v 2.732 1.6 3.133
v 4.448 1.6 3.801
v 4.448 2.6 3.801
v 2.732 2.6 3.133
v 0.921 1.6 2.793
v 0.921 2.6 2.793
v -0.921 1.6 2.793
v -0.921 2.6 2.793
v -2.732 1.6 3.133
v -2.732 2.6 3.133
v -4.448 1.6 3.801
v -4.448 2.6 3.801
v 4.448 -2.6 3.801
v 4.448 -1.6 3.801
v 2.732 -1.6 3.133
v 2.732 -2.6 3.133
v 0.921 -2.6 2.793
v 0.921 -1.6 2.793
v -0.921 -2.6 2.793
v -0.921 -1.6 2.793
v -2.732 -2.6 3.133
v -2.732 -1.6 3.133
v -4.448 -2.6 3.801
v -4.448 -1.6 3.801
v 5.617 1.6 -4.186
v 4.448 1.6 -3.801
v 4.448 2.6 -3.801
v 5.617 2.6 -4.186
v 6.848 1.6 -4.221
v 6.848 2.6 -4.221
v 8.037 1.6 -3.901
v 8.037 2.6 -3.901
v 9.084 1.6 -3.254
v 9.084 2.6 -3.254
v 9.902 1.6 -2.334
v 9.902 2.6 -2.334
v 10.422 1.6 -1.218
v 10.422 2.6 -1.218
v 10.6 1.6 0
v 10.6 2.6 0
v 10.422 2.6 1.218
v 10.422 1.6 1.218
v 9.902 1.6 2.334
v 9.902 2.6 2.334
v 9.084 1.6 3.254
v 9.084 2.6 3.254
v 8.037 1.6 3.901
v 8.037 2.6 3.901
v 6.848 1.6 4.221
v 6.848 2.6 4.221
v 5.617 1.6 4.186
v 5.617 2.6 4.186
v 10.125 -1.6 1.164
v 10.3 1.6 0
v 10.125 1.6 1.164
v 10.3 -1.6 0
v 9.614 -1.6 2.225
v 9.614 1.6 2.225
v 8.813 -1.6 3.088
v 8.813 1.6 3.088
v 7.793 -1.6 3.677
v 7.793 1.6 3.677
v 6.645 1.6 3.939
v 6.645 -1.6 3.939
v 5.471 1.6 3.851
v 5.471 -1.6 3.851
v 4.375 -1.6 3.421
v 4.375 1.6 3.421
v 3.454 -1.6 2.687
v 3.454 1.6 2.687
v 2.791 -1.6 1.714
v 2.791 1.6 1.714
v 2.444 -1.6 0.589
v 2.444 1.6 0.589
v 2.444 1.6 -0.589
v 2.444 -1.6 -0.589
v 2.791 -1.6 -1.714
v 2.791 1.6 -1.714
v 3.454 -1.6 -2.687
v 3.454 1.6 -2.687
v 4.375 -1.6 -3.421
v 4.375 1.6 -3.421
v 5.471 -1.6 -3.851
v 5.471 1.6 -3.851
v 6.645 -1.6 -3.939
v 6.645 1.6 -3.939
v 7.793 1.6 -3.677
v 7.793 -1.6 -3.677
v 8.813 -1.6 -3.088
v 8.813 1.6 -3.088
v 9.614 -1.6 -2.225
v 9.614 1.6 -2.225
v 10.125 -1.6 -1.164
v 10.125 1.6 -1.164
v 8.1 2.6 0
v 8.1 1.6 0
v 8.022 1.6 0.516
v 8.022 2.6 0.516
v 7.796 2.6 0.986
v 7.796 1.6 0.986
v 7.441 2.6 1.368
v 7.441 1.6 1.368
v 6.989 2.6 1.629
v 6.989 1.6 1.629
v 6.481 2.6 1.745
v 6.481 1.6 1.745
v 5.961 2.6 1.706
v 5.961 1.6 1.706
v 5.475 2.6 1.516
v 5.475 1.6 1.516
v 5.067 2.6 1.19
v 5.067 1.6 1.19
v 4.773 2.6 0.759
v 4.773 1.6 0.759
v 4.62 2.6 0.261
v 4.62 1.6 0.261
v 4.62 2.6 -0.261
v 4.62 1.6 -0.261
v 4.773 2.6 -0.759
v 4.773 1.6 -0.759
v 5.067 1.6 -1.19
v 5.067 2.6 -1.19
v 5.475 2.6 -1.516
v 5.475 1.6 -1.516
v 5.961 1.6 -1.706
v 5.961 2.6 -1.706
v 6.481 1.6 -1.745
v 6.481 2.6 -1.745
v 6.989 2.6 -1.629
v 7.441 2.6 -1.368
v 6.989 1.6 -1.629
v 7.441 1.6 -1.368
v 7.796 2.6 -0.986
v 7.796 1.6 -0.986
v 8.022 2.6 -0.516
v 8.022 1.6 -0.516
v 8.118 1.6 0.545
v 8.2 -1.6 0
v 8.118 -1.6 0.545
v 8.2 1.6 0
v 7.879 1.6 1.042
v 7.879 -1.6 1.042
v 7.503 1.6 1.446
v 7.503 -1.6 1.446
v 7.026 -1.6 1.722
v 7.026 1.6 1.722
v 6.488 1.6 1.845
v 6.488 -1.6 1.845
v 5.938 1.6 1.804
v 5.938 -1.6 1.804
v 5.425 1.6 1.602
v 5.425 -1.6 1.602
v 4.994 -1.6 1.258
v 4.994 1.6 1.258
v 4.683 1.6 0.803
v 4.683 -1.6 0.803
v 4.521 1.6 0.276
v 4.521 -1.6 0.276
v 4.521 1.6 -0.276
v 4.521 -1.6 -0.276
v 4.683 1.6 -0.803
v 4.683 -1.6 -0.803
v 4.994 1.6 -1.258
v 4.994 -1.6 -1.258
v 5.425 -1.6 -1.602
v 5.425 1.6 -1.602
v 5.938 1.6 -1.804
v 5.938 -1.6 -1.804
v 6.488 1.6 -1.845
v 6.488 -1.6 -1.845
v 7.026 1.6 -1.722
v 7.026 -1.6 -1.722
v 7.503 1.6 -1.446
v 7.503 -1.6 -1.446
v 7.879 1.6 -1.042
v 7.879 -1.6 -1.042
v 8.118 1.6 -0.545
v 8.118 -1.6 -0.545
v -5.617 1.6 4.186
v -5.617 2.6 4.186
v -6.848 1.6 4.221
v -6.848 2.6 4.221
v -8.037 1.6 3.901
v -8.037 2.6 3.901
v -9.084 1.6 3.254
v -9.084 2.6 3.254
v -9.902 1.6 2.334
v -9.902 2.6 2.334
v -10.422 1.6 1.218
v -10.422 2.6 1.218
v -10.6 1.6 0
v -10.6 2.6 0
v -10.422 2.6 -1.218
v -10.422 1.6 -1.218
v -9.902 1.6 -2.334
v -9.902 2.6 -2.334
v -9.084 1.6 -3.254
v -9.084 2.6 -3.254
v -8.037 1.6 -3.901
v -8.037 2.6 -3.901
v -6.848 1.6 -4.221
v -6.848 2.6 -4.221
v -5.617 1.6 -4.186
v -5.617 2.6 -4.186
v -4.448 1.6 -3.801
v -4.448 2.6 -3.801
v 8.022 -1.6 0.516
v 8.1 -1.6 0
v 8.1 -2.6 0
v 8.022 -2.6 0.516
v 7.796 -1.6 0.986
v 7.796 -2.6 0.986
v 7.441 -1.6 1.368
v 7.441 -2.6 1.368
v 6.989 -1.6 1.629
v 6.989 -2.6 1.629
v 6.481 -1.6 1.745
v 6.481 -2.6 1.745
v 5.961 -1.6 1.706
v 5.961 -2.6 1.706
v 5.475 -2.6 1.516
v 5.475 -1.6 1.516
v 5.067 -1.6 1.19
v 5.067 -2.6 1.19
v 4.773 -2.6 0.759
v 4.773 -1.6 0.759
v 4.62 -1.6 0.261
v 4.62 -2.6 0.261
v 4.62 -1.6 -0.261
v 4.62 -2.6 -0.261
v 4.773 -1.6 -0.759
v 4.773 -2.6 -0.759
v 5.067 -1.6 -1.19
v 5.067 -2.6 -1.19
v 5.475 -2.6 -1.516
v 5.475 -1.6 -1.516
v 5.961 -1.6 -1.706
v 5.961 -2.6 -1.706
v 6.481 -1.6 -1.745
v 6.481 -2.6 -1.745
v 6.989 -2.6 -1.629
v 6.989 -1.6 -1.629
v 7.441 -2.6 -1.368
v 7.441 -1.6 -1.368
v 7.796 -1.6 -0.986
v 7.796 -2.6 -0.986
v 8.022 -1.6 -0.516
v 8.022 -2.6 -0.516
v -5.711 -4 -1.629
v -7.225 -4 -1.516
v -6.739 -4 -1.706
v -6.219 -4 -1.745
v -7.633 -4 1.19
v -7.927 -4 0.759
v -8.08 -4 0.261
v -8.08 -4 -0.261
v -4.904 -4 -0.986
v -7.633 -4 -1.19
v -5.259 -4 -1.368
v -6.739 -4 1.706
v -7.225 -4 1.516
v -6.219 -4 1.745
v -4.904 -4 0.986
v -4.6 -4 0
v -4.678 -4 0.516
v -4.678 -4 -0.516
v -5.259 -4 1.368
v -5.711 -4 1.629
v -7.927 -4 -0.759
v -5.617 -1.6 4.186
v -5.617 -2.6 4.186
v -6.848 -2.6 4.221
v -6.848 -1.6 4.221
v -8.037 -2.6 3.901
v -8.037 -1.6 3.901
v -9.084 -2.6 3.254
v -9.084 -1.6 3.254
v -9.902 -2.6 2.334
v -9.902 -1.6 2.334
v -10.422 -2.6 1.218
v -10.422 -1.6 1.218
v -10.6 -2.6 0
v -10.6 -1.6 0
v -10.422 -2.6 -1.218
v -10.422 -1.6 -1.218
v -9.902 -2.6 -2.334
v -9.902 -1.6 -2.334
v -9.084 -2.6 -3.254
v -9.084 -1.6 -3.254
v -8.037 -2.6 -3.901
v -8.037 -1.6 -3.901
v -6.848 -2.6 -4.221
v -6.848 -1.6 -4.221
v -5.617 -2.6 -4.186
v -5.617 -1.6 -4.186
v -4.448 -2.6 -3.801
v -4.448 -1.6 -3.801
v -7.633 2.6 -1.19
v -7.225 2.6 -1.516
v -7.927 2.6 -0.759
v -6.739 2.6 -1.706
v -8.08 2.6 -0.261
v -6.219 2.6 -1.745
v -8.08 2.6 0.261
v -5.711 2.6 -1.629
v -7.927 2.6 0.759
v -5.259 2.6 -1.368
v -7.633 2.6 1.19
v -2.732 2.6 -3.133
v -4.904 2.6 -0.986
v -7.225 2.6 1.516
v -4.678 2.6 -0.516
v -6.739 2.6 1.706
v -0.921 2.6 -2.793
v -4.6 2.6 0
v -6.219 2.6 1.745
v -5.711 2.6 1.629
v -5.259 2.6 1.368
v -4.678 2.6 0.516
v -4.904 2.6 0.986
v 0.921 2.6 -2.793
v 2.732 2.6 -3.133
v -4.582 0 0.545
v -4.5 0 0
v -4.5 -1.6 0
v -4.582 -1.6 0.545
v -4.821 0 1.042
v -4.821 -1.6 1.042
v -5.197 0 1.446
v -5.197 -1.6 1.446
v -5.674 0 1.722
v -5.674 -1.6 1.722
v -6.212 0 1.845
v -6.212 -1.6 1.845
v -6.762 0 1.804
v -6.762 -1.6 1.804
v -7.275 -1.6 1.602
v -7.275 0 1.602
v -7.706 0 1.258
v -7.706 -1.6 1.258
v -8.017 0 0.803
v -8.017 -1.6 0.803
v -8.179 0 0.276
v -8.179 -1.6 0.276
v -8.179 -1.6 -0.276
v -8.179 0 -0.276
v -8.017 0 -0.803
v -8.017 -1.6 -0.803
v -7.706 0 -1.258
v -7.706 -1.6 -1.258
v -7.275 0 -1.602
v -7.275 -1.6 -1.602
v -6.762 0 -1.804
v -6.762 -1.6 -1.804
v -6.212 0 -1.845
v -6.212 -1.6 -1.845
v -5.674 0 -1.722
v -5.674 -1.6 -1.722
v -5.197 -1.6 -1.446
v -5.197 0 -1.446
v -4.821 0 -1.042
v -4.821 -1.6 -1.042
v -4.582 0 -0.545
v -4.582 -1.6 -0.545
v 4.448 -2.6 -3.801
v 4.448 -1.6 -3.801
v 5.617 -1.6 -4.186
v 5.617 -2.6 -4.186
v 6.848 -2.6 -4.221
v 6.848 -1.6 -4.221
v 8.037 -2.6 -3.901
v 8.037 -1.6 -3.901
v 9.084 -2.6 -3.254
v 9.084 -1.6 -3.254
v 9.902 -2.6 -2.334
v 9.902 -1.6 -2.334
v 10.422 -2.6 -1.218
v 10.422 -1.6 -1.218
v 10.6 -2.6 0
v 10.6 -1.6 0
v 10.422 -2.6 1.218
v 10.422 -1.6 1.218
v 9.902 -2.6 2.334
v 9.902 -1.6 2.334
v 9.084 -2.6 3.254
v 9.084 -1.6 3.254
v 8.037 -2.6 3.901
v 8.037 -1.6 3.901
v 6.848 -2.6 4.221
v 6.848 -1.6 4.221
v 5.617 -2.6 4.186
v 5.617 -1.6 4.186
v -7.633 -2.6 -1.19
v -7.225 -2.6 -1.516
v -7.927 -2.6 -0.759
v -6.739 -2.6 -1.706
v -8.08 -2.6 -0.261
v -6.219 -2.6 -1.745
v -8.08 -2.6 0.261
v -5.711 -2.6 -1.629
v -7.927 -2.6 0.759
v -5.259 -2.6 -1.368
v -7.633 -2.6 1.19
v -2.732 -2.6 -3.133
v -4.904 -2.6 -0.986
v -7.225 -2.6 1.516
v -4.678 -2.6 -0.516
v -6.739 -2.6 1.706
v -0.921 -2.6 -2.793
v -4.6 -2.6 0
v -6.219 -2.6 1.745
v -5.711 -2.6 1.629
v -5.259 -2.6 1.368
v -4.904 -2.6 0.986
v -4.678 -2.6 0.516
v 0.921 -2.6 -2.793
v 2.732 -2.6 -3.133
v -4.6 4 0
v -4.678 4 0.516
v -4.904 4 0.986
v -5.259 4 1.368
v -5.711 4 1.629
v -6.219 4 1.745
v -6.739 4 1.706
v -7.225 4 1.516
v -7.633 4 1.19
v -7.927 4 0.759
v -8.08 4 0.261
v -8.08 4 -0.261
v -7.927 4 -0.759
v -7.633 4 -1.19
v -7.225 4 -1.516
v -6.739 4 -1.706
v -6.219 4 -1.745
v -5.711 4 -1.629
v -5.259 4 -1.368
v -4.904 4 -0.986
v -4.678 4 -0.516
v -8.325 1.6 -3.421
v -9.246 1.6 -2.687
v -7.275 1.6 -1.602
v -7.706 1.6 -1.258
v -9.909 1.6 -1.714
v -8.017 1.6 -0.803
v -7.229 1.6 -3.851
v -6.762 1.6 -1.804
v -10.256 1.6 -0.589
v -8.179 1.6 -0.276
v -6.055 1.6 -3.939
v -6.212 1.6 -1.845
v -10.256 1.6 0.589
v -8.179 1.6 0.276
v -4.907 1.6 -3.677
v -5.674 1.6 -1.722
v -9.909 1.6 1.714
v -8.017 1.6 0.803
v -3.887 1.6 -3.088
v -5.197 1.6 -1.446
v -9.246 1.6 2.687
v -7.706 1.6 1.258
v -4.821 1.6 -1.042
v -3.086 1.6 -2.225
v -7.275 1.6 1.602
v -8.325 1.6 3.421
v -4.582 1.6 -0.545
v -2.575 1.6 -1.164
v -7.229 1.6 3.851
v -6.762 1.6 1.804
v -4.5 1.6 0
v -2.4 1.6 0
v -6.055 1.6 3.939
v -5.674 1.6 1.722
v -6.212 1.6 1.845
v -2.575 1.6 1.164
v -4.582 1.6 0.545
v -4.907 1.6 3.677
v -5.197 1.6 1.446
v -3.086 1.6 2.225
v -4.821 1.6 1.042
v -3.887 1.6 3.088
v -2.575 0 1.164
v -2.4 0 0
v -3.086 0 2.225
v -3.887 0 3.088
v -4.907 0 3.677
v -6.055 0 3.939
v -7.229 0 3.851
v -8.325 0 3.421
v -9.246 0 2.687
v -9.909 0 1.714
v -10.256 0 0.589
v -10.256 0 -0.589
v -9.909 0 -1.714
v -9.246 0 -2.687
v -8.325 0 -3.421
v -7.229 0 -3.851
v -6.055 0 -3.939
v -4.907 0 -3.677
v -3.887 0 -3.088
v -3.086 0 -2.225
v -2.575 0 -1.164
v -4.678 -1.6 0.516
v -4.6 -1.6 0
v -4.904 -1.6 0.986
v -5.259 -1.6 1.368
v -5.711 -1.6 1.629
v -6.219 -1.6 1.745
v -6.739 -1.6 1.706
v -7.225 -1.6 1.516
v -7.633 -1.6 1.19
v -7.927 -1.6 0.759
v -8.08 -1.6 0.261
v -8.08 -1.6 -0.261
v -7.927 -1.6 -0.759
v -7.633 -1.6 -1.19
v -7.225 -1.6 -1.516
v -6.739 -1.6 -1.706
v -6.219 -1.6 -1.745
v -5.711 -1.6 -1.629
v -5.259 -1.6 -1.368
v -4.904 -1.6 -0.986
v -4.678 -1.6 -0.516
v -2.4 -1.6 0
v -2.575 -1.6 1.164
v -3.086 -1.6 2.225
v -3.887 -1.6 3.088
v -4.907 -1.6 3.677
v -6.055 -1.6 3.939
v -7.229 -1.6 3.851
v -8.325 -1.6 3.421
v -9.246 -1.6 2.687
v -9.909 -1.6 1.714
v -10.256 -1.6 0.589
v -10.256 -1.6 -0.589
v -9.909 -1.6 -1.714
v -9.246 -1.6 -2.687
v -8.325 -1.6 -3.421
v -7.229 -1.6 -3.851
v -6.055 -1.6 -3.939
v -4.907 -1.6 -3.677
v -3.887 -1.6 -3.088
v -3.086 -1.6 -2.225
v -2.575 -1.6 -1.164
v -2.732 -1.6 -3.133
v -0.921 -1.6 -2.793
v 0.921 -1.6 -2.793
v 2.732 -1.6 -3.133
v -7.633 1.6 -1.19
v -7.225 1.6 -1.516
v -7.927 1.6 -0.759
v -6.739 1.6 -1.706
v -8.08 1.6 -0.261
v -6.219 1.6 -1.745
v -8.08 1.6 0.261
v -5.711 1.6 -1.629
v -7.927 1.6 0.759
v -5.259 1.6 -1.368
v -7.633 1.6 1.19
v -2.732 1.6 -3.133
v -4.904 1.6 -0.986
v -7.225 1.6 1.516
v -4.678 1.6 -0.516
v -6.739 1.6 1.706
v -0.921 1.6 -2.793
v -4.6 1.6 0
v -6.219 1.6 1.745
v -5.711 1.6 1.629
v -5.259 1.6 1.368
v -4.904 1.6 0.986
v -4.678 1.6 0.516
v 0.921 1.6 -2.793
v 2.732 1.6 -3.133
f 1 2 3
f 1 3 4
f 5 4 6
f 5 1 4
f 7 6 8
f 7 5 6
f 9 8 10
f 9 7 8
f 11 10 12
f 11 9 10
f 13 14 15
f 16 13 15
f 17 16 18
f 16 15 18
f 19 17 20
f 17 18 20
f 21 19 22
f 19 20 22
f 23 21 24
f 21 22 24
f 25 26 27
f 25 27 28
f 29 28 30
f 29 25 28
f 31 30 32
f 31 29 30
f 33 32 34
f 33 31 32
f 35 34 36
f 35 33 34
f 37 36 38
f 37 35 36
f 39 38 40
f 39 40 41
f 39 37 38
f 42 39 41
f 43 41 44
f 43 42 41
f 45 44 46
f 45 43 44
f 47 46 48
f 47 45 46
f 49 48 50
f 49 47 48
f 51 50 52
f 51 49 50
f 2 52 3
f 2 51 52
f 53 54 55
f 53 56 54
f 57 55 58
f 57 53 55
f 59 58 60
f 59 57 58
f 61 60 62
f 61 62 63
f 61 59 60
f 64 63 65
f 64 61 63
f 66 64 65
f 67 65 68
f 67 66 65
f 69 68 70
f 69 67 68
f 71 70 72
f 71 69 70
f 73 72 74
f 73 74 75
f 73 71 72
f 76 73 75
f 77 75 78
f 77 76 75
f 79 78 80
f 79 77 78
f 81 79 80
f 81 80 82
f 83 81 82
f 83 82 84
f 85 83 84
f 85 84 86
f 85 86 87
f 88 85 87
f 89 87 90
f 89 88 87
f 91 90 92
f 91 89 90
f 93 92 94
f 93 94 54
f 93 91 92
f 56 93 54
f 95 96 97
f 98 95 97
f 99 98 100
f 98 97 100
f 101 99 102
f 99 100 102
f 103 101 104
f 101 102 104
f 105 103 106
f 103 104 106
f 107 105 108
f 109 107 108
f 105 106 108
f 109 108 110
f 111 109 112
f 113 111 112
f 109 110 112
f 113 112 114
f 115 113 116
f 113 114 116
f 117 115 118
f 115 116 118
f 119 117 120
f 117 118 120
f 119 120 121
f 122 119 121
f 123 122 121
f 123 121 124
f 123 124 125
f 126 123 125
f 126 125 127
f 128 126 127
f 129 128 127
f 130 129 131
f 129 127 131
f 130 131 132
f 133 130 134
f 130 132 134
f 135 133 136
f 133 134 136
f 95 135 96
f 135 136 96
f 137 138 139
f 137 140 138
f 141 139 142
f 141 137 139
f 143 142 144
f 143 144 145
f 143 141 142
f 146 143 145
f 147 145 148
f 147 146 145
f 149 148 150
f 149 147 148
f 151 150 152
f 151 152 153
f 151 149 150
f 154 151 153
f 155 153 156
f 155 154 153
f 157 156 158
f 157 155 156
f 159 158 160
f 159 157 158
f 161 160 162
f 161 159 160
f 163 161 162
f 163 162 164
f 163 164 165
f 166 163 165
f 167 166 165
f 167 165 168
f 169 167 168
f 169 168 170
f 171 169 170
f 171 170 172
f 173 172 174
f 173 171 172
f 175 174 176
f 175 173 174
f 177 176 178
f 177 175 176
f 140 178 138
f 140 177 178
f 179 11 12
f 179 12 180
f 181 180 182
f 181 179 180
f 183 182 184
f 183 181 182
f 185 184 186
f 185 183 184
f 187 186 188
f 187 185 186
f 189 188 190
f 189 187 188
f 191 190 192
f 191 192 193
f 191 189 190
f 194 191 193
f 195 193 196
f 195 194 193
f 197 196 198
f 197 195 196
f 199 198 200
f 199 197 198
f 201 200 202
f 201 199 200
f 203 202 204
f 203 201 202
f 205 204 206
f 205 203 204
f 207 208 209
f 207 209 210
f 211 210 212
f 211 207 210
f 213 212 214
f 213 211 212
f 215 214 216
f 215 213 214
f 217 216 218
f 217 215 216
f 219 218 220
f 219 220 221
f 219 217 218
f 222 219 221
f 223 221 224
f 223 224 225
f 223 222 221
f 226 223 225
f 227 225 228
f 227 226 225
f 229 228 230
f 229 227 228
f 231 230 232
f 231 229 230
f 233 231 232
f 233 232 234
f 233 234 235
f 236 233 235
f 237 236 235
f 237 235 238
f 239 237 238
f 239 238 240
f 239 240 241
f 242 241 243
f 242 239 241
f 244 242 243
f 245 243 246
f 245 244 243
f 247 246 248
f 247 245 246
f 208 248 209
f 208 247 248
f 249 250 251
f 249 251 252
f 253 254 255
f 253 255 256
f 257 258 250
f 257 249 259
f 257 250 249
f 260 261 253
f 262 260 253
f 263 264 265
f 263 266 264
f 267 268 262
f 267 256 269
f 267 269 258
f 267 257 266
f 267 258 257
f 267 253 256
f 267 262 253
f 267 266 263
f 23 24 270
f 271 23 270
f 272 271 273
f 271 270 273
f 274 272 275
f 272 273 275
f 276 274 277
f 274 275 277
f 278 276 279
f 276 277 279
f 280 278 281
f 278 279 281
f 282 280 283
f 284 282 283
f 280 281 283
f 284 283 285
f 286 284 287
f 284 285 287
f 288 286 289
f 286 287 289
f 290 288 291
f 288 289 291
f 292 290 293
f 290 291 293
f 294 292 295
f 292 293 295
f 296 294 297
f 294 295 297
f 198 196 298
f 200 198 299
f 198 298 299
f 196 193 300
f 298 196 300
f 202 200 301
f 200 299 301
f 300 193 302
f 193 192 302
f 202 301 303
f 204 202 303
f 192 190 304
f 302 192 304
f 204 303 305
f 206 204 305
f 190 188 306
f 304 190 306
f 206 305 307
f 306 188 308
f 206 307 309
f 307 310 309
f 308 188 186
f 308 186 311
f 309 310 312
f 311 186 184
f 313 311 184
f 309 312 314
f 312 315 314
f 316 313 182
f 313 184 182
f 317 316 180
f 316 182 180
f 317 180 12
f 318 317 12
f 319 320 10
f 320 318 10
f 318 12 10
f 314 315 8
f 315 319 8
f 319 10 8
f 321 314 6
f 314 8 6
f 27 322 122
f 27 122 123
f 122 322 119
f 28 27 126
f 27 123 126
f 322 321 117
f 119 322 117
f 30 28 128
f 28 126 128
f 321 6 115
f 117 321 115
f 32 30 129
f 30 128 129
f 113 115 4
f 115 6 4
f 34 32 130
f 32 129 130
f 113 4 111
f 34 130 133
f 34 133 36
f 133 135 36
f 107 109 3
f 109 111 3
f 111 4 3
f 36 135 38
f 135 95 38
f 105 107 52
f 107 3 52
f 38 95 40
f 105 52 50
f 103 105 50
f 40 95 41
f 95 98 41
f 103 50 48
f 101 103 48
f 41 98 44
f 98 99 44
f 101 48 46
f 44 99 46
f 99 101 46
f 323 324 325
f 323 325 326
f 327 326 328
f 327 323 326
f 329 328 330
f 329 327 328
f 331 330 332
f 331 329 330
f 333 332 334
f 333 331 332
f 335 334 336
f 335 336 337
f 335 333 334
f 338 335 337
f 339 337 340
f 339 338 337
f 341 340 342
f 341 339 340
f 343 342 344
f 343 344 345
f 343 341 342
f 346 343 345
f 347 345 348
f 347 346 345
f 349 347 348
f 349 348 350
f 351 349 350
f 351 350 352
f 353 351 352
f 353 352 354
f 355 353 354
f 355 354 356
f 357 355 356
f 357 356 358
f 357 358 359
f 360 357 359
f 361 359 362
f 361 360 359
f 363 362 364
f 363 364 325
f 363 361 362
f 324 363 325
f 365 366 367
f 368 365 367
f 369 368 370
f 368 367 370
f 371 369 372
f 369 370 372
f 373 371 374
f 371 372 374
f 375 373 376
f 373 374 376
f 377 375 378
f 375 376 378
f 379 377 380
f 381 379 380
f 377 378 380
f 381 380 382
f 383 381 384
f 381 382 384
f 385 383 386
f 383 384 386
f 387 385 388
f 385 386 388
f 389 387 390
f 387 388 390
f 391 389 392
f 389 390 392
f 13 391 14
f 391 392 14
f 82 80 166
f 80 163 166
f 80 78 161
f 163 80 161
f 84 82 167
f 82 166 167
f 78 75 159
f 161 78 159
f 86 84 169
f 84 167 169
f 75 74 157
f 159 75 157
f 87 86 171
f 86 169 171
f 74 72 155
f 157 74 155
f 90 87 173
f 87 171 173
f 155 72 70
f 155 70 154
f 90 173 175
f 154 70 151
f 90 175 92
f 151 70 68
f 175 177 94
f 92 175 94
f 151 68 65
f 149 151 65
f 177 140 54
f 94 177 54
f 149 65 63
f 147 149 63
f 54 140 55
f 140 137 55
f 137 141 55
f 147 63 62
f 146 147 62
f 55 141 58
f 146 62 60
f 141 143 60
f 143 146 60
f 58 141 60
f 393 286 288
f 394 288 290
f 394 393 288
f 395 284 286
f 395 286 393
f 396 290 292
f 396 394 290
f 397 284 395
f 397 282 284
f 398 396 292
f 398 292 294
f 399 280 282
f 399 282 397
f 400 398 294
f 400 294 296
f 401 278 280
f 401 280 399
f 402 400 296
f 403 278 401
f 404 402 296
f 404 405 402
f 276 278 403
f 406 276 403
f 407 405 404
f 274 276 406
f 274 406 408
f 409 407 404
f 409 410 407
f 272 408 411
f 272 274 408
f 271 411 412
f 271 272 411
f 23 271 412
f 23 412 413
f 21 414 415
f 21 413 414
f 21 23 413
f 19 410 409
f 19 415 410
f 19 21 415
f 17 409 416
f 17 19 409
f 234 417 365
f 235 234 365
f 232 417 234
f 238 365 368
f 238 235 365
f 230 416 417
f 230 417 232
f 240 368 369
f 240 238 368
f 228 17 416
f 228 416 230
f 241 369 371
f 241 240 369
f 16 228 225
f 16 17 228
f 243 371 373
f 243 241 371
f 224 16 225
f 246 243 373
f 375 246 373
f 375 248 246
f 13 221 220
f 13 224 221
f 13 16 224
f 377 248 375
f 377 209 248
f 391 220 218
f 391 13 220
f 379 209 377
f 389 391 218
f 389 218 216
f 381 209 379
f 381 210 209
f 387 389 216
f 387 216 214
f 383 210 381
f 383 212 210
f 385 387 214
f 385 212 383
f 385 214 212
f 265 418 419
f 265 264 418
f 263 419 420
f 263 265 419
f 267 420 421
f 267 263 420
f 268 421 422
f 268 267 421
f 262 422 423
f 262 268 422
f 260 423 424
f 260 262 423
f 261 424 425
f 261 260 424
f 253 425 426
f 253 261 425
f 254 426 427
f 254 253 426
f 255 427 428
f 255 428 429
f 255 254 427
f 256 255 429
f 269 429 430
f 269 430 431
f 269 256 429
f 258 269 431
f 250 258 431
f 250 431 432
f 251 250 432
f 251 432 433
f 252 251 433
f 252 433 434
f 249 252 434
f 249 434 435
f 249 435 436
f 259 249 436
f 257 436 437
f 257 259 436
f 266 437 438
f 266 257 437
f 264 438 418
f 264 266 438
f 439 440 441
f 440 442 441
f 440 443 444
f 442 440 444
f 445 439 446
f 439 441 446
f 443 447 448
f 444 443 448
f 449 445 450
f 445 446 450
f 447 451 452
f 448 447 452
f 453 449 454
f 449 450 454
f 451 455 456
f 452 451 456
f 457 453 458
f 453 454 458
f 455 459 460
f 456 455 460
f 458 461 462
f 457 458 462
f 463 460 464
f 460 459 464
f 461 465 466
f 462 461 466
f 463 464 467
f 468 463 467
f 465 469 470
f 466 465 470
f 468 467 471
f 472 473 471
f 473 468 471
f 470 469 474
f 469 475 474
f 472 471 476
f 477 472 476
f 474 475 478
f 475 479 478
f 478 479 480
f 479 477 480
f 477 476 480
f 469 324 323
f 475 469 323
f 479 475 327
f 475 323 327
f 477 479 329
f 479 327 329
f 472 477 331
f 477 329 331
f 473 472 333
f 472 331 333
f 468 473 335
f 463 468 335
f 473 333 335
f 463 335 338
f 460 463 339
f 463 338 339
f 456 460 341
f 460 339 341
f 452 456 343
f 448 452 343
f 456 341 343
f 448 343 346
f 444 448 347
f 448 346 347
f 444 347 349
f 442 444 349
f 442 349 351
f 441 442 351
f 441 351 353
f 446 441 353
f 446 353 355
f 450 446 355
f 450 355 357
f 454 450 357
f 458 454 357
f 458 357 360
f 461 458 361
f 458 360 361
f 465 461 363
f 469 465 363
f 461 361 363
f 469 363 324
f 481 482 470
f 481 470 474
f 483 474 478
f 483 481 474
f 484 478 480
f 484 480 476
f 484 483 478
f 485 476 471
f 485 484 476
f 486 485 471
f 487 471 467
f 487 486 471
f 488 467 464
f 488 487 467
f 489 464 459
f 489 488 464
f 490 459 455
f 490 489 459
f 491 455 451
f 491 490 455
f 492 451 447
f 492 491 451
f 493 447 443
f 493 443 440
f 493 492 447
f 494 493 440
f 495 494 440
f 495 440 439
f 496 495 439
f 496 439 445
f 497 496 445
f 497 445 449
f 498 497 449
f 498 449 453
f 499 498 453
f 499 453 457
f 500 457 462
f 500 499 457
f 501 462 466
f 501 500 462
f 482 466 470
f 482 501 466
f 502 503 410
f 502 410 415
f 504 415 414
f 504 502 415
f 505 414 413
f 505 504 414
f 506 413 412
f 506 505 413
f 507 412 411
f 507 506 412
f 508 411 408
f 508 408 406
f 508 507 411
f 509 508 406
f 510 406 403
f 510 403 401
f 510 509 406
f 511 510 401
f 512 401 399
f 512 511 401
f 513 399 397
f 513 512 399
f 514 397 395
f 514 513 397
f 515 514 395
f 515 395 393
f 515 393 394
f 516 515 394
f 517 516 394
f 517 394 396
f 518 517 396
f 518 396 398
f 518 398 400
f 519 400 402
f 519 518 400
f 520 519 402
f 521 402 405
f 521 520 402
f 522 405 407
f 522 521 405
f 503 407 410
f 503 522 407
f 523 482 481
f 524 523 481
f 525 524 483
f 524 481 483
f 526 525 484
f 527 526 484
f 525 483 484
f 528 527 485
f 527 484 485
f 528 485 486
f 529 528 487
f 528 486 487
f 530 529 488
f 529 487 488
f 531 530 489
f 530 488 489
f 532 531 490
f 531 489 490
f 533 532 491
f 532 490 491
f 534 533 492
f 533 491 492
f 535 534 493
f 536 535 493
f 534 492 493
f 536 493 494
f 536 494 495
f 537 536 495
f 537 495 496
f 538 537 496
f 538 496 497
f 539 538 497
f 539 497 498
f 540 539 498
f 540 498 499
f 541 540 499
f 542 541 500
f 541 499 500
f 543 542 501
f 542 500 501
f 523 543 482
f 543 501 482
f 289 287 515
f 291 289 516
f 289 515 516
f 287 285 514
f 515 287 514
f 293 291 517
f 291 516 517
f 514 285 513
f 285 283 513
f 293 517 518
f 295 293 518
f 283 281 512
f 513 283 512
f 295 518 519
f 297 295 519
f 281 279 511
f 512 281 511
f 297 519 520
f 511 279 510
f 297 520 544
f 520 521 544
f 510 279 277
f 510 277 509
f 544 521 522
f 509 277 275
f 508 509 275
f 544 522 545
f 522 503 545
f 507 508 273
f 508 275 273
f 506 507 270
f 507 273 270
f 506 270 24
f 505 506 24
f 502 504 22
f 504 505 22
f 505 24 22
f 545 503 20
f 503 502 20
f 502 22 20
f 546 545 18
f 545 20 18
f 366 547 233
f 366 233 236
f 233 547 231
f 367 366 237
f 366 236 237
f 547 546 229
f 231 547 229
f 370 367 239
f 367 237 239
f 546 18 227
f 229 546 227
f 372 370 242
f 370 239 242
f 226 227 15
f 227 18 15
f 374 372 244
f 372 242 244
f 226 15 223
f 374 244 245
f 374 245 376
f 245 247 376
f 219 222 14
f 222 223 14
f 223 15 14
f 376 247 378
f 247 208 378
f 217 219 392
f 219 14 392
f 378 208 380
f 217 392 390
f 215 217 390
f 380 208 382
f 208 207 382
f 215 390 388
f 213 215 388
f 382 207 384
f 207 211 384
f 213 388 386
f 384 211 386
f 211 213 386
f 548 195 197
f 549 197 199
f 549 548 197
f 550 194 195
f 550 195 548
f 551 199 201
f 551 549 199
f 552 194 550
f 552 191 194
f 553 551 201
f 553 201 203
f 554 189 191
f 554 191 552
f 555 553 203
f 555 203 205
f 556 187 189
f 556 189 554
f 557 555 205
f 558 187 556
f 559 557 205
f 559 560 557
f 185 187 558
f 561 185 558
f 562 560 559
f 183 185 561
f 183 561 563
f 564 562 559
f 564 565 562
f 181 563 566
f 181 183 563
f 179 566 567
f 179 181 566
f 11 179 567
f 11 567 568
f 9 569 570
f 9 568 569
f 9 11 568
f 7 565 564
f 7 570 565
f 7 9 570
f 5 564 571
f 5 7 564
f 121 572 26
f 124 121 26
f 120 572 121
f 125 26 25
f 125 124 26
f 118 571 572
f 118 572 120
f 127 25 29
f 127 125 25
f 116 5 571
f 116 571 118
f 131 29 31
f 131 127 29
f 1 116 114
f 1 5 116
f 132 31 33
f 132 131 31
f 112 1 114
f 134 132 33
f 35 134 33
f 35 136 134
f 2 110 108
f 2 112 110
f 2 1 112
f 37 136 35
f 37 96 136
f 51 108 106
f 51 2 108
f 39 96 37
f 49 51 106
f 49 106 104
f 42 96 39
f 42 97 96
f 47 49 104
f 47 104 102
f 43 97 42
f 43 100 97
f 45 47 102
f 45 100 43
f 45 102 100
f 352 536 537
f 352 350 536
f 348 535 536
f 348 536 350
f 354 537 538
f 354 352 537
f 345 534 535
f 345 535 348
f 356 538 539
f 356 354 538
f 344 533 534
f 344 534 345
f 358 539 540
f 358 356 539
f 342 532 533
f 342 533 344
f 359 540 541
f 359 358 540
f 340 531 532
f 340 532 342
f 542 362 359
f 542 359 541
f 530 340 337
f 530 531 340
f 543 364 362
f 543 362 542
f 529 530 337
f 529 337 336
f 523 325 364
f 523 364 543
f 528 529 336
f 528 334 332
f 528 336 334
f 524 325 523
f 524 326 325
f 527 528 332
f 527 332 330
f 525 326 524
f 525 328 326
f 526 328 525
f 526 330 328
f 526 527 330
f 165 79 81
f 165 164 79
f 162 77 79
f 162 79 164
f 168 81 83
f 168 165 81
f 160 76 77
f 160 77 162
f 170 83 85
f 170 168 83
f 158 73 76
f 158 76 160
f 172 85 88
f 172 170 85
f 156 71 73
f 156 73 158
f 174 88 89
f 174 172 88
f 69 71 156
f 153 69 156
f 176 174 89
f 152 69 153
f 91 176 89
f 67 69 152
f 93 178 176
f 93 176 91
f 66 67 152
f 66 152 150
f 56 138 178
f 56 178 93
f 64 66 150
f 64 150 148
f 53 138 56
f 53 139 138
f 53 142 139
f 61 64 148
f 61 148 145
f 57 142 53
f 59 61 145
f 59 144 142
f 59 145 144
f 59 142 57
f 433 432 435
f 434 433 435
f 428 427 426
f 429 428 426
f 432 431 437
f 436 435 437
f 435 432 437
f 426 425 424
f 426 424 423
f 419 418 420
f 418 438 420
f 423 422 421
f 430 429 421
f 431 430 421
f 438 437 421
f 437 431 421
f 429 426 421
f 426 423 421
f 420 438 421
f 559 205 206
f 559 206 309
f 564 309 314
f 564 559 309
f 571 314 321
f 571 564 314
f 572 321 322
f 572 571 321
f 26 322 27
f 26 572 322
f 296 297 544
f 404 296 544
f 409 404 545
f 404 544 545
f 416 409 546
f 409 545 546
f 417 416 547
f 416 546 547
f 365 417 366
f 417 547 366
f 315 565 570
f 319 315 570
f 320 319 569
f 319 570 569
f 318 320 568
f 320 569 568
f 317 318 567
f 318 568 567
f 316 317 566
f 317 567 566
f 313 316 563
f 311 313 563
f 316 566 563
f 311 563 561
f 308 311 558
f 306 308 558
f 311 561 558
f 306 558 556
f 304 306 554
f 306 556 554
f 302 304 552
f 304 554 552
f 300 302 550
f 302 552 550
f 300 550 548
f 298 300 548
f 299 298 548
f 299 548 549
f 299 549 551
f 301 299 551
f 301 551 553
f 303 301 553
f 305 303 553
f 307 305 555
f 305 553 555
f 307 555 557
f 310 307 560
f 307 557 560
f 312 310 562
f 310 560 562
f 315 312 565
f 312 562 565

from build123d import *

# Parameters (mm, degrees)
F0_R     = 3.95
F0_R_2   = 1.85
F1_DEPTH = 1.6
F2_R     = 1.75
F3_DEPTH = 1
F5_R     = 1.75
F6_DEPTH = 4


with BuildPart() as f1:
    # F0 (on Front) → F1 (new body, symmetric)
    with BuildSketch(Plane.XZ):
        with Locations((-6.35, 0)):
            Circle(F0_R)
        with Locations((-6.35, 0)):
            Circle(F0_R_2, mode=Mode.SUBTRACT)
        with Locations((6.35, 0)):
            Circle(F0_R)
        with Locations((6.35, 0)):
            Circle(F0_R_2, mode=Mode.SUBTRACT)
    extrude(amount=F1_DEPTH, both=True)


with BuildPart() as f3:
    # F2 (on face) → F3 (new body)
    with BuildSketch(Plane.XZ.offset(1.6)):
        with BuildLine():
            ThreePointArc((4.448244, 3.800766), (0, 2.75), (-4.448244, 3.800766))
            ThreePointArc((-4.448244, 3.800766), (-10.6, 0), (-4.448244, -3.800766))
            ThreePointArc((-4.448244, -3.800766), (0, -2.75), (4.448244, -3.800766))
            ThreePointArc((4.448244, -3.800766), (10.6, 0), (4.448244, 3.800766))
        make_face()
        with Locations((-6.35, 0)):
            Circle(F2_R, mode=Mode.SUBTRACT)
        with Locations((6.35, 0)):
            Circle(F2_R, mode=Mode.SUBTRACT)
    extrude(amount=F3_DEPTH)


with BuildPart() as f4_1:
    # F4: instance of F3
    add(f3.part.mirror(Plane.XZ))


with BuildPart() as f6:
    # F5 (on Front) → F6 (new body, symmetric)
    with BuildSketch(Plane.XZ):
        with Locations((-6.35, 0)):
            Circle(F5_R)
    extrude(amount=F6_DEPTH, both=True)


solid = Compound([f1.part, f3.part, f4_1.part, f6.part])
